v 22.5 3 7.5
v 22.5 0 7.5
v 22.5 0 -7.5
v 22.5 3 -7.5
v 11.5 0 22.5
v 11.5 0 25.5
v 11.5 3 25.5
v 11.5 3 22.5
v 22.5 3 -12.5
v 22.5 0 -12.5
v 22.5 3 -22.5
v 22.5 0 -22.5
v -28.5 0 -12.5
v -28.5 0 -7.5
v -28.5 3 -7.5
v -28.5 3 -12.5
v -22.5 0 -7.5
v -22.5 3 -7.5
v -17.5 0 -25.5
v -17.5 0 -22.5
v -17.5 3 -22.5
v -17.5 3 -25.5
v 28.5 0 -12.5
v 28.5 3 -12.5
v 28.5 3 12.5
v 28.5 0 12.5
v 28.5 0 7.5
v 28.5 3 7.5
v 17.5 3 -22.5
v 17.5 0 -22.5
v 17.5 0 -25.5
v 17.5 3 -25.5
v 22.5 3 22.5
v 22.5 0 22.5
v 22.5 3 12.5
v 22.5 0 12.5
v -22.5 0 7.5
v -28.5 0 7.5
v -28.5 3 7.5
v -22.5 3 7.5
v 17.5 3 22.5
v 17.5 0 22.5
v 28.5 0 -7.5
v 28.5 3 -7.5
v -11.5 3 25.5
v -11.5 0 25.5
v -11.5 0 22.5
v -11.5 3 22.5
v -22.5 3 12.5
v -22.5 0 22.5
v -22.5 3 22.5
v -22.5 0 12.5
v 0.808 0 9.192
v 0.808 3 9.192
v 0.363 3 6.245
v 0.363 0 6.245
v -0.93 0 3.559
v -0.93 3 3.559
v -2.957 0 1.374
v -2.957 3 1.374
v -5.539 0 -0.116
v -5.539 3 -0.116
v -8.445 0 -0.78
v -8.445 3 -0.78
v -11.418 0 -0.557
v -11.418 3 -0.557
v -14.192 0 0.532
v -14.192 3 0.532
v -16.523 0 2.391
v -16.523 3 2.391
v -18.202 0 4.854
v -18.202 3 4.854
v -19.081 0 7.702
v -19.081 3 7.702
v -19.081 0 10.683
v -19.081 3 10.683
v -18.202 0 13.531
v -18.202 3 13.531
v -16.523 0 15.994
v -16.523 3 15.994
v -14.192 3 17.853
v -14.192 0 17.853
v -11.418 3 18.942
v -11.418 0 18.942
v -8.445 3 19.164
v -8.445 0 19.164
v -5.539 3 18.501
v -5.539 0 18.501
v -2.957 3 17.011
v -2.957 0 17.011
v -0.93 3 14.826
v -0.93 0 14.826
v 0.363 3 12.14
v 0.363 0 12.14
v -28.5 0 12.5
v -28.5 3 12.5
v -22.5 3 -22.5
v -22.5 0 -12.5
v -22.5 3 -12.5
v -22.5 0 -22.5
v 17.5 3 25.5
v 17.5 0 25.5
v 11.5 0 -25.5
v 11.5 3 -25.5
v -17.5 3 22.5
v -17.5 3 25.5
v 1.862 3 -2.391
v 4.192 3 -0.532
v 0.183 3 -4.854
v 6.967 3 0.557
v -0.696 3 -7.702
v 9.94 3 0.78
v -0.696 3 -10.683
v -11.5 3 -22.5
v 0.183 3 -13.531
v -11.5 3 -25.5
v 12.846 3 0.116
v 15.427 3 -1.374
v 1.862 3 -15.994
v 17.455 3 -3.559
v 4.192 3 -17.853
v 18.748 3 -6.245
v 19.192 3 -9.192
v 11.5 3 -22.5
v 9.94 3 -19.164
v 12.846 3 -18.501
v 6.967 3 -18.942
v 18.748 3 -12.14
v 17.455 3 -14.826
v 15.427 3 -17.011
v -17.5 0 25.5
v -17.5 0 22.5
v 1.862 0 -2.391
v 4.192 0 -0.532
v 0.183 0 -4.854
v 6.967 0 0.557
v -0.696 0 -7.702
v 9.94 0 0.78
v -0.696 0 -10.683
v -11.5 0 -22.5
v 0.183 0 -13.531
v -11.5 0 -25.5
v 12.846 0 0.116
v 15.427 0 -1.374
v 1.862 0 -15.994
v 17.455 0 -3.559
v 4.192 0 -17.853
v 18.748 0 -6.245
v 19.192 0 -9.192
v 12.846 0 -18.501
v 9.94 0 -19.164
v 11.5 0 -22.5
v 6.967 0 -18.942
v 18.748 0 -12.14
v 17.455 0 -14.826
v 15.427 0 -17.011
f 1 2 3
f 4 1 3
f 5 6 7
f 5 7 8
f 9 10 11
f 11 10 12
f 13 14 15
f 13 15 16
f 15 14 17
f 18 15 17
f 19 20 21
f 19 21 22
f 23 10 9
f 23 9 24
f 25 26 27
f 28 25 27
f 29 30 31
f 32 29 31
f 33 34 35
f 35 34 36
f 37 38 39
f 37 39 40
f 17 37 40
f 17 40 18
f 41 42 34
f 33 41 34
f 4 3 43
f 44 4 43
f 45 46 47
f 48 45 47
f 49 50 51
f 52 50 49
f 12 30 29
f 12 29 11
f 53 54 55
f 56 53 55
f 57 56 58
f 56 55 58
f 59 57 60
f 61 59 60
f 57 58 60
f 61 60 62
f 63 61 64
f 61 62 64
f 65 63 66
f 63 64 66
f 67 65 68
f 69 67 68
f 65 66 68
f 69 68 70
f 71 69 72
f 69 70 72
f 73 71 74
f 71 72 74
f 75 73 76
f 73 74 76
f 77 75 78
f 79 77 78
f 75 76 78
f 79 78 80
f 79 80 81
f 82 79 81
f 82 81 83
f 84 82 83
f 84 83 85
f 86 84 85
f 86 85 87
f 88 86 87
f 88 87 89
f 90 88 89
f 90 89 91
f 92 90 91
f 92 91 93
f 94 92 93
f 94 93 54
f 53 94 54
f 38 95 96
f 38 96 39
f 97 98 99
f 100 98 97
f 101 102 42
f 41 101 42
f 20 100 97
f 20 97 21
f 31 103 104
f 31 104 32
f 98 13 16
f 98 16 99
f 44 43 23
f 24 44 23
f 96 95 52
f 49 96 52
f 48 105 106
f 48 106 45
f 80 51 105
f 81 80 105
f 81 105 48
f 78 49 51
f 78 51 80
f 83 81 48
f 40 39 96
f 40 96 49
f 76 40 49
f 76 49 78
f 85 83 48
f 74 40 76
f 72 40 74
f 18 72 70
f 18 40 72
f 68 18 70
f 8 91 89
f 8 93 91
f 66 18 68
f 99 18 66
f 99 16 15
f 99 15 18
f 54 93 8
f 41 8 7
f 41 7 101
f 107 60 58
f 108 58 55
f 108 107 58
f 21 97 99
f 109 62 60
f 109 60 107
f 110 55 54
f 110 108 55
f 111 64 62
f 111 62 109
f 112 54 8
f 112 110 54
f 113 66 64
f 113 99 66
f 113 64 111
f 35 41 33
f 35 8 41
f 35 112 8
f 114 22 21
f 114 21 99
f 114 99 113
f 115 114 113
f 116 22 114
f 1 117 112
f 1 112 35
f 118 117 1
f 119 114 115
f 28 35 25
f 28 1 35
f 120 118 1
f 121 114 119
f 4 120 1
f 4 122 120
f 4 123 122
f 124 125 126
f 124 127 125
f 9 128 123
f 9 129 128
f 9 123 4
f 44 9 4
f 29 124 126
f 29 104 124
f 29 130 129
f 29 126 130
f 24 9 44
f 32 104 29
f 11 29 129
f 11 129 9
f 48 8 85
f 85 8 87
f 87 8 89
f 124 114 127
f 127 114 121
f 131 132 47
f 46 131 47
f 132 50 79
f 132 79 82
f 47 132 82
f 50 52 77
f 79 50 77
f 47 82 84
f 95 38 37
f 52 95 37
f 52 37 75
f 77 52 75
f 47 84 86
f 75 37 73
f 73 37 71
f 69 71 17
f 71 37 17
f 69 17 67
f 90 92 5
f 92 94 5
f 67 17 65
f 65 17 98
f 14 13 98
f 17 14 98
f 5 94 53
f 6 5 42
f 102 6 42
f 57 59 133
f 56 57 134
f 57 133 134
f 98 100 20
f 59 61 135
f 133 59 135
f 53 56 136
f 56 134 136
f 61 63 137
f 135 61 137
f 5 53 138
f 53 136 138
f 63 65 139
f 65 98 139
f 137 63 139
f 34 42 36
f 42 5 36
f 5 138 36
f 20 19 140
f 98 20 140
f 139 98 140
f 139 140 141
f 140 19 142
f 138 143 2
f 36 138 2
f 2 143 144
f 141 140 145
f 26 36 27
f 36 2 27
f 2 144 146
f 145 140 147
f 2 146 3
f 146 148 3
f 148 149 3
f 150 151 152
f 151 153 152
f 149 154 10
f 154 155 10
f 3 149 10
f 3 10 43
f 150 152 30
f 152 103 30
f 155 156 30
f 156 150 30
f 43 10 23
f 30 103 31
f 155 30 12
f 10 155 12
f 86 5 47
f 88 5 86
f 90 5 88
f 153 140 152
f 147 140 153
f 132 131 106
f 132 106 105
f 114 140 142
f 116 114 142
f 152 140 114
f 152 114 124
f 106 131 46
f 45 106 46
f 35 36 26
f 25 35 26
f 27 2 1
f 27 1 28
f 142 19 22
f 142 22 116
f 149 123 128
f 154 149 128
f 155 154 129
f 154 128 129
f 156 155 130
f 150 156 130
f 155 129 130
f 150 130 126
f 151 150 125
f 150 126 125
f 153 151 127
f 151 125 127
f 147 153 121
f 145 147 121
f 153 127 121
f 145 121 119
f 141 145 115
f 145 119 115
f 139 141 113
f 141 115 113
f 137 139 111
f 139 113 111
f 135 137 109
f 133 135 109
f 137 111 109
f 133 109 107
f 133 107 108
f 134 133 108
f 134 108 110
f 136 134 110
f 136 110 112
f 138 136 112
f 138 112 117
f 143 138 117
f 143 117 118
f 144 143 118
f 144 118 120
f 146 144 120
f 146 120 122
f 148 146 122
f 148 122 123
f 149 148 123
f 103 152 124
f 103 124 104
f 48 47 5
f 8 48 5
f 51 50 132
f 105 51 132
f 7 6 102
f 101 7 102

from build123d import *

# Parameters (mm, degrees)
SALIENTE_EXTRUIR1_DEPTH = 3
CROQUIS1_4_W            = 6
CROQUIS1_4_H            = 5
SALIENTE_EXTRUIR2_DEPTH = 3
CROQUIS2_R              = 10
CORTAR_EXTRUIR3_DEPTH   = 39.360135558
CROQUIS1_5_W            = 6
CROQUIS1_5_H            = 5
SALIENTE_EXTRUIR3_DEPTH = 3


with BuildPart() as part:
    # Croquis1 → Saliente-Extruir1 (new body)
    with BuildSketch(Plane(origin=(0, 0, 0), x_dir=(1, 0, 0), z_dir=(0, 1, 0))):
        Polygon((-17.5, 22.5), (-22.5, 22.5), (-22.5, -22.5), (-17.5, -22.5), (-17.5, -25.5), (-11.5, -25.5), (-11.5, -22.5), (11.5, -22.5), (11.5, -25.5), (17.5, -25.5), (17.5, -22.5), (22.5, -22.5), (22.5, 22.5), (17.5, 22.5), (17.5, 25.5), (11.5, 25.5), (11.5, 22.5), (-11.5, 22.5), (-11.5, 25.5), (-17.5, 25.5), align=None)
    extrude(amount=SALIENTE_EXTRUIR1_DEPTH)

    # Croquis1_4 → Saliente-Extruir2 (add)
    with BuildSketch(Plane(origin=(0, 0, 0), x_dir=(1, 0, 0), z_dir=(0, 1, 0))):
        with Locations((-25.5, -10)):
            Rectangle(CROQUIS1_4_W, CROQUIS1_4_H)
        with Locations((25.5, -10)):
            Rectangle(CROQUIS1_4_W, CROQUIS1_4_H)
    extrude(amount=SALIENTE_EXTRUIR2_DEPTH)

    # Croquis2 → Cortar-Extruir3 (cut, through all)
    with BuildSketch(Plane(origin=(0, 3, 0), x_dir=(1, 0, 0), z_dir=(0, 1, 0))):
        with Locations((-9.192388155, -9.192388155)):
            Circle(CROQUIS2_R)
        with Locations((9.192388155, 9.192388155)):
            Circle(CROQUIS2_R)
    extrude(amount=-CORTAR_EXTRUIR3_DEPTH, mode=Mode.SUBTRACT)

    # Croquis1_5 → Saliente-Extruir3 (add)
    with BuildSketch(Plane(origin=(0, 0, 0), x_dir=(1, 0, 0), z_dir=(0, 1, 0))):
        with Locations((-25.5, 10)):
            Rectangle(CROQUIS1_5_W, CROQUIS1_5_H)
        with Locations((25.5, 10)):
            Rectangle(CROQUIS1_5_W, CROQUIS1_5_H)
    extrude(amount=SALIENTE_EXTRUIR3_DEPTH)


solid = part.part
